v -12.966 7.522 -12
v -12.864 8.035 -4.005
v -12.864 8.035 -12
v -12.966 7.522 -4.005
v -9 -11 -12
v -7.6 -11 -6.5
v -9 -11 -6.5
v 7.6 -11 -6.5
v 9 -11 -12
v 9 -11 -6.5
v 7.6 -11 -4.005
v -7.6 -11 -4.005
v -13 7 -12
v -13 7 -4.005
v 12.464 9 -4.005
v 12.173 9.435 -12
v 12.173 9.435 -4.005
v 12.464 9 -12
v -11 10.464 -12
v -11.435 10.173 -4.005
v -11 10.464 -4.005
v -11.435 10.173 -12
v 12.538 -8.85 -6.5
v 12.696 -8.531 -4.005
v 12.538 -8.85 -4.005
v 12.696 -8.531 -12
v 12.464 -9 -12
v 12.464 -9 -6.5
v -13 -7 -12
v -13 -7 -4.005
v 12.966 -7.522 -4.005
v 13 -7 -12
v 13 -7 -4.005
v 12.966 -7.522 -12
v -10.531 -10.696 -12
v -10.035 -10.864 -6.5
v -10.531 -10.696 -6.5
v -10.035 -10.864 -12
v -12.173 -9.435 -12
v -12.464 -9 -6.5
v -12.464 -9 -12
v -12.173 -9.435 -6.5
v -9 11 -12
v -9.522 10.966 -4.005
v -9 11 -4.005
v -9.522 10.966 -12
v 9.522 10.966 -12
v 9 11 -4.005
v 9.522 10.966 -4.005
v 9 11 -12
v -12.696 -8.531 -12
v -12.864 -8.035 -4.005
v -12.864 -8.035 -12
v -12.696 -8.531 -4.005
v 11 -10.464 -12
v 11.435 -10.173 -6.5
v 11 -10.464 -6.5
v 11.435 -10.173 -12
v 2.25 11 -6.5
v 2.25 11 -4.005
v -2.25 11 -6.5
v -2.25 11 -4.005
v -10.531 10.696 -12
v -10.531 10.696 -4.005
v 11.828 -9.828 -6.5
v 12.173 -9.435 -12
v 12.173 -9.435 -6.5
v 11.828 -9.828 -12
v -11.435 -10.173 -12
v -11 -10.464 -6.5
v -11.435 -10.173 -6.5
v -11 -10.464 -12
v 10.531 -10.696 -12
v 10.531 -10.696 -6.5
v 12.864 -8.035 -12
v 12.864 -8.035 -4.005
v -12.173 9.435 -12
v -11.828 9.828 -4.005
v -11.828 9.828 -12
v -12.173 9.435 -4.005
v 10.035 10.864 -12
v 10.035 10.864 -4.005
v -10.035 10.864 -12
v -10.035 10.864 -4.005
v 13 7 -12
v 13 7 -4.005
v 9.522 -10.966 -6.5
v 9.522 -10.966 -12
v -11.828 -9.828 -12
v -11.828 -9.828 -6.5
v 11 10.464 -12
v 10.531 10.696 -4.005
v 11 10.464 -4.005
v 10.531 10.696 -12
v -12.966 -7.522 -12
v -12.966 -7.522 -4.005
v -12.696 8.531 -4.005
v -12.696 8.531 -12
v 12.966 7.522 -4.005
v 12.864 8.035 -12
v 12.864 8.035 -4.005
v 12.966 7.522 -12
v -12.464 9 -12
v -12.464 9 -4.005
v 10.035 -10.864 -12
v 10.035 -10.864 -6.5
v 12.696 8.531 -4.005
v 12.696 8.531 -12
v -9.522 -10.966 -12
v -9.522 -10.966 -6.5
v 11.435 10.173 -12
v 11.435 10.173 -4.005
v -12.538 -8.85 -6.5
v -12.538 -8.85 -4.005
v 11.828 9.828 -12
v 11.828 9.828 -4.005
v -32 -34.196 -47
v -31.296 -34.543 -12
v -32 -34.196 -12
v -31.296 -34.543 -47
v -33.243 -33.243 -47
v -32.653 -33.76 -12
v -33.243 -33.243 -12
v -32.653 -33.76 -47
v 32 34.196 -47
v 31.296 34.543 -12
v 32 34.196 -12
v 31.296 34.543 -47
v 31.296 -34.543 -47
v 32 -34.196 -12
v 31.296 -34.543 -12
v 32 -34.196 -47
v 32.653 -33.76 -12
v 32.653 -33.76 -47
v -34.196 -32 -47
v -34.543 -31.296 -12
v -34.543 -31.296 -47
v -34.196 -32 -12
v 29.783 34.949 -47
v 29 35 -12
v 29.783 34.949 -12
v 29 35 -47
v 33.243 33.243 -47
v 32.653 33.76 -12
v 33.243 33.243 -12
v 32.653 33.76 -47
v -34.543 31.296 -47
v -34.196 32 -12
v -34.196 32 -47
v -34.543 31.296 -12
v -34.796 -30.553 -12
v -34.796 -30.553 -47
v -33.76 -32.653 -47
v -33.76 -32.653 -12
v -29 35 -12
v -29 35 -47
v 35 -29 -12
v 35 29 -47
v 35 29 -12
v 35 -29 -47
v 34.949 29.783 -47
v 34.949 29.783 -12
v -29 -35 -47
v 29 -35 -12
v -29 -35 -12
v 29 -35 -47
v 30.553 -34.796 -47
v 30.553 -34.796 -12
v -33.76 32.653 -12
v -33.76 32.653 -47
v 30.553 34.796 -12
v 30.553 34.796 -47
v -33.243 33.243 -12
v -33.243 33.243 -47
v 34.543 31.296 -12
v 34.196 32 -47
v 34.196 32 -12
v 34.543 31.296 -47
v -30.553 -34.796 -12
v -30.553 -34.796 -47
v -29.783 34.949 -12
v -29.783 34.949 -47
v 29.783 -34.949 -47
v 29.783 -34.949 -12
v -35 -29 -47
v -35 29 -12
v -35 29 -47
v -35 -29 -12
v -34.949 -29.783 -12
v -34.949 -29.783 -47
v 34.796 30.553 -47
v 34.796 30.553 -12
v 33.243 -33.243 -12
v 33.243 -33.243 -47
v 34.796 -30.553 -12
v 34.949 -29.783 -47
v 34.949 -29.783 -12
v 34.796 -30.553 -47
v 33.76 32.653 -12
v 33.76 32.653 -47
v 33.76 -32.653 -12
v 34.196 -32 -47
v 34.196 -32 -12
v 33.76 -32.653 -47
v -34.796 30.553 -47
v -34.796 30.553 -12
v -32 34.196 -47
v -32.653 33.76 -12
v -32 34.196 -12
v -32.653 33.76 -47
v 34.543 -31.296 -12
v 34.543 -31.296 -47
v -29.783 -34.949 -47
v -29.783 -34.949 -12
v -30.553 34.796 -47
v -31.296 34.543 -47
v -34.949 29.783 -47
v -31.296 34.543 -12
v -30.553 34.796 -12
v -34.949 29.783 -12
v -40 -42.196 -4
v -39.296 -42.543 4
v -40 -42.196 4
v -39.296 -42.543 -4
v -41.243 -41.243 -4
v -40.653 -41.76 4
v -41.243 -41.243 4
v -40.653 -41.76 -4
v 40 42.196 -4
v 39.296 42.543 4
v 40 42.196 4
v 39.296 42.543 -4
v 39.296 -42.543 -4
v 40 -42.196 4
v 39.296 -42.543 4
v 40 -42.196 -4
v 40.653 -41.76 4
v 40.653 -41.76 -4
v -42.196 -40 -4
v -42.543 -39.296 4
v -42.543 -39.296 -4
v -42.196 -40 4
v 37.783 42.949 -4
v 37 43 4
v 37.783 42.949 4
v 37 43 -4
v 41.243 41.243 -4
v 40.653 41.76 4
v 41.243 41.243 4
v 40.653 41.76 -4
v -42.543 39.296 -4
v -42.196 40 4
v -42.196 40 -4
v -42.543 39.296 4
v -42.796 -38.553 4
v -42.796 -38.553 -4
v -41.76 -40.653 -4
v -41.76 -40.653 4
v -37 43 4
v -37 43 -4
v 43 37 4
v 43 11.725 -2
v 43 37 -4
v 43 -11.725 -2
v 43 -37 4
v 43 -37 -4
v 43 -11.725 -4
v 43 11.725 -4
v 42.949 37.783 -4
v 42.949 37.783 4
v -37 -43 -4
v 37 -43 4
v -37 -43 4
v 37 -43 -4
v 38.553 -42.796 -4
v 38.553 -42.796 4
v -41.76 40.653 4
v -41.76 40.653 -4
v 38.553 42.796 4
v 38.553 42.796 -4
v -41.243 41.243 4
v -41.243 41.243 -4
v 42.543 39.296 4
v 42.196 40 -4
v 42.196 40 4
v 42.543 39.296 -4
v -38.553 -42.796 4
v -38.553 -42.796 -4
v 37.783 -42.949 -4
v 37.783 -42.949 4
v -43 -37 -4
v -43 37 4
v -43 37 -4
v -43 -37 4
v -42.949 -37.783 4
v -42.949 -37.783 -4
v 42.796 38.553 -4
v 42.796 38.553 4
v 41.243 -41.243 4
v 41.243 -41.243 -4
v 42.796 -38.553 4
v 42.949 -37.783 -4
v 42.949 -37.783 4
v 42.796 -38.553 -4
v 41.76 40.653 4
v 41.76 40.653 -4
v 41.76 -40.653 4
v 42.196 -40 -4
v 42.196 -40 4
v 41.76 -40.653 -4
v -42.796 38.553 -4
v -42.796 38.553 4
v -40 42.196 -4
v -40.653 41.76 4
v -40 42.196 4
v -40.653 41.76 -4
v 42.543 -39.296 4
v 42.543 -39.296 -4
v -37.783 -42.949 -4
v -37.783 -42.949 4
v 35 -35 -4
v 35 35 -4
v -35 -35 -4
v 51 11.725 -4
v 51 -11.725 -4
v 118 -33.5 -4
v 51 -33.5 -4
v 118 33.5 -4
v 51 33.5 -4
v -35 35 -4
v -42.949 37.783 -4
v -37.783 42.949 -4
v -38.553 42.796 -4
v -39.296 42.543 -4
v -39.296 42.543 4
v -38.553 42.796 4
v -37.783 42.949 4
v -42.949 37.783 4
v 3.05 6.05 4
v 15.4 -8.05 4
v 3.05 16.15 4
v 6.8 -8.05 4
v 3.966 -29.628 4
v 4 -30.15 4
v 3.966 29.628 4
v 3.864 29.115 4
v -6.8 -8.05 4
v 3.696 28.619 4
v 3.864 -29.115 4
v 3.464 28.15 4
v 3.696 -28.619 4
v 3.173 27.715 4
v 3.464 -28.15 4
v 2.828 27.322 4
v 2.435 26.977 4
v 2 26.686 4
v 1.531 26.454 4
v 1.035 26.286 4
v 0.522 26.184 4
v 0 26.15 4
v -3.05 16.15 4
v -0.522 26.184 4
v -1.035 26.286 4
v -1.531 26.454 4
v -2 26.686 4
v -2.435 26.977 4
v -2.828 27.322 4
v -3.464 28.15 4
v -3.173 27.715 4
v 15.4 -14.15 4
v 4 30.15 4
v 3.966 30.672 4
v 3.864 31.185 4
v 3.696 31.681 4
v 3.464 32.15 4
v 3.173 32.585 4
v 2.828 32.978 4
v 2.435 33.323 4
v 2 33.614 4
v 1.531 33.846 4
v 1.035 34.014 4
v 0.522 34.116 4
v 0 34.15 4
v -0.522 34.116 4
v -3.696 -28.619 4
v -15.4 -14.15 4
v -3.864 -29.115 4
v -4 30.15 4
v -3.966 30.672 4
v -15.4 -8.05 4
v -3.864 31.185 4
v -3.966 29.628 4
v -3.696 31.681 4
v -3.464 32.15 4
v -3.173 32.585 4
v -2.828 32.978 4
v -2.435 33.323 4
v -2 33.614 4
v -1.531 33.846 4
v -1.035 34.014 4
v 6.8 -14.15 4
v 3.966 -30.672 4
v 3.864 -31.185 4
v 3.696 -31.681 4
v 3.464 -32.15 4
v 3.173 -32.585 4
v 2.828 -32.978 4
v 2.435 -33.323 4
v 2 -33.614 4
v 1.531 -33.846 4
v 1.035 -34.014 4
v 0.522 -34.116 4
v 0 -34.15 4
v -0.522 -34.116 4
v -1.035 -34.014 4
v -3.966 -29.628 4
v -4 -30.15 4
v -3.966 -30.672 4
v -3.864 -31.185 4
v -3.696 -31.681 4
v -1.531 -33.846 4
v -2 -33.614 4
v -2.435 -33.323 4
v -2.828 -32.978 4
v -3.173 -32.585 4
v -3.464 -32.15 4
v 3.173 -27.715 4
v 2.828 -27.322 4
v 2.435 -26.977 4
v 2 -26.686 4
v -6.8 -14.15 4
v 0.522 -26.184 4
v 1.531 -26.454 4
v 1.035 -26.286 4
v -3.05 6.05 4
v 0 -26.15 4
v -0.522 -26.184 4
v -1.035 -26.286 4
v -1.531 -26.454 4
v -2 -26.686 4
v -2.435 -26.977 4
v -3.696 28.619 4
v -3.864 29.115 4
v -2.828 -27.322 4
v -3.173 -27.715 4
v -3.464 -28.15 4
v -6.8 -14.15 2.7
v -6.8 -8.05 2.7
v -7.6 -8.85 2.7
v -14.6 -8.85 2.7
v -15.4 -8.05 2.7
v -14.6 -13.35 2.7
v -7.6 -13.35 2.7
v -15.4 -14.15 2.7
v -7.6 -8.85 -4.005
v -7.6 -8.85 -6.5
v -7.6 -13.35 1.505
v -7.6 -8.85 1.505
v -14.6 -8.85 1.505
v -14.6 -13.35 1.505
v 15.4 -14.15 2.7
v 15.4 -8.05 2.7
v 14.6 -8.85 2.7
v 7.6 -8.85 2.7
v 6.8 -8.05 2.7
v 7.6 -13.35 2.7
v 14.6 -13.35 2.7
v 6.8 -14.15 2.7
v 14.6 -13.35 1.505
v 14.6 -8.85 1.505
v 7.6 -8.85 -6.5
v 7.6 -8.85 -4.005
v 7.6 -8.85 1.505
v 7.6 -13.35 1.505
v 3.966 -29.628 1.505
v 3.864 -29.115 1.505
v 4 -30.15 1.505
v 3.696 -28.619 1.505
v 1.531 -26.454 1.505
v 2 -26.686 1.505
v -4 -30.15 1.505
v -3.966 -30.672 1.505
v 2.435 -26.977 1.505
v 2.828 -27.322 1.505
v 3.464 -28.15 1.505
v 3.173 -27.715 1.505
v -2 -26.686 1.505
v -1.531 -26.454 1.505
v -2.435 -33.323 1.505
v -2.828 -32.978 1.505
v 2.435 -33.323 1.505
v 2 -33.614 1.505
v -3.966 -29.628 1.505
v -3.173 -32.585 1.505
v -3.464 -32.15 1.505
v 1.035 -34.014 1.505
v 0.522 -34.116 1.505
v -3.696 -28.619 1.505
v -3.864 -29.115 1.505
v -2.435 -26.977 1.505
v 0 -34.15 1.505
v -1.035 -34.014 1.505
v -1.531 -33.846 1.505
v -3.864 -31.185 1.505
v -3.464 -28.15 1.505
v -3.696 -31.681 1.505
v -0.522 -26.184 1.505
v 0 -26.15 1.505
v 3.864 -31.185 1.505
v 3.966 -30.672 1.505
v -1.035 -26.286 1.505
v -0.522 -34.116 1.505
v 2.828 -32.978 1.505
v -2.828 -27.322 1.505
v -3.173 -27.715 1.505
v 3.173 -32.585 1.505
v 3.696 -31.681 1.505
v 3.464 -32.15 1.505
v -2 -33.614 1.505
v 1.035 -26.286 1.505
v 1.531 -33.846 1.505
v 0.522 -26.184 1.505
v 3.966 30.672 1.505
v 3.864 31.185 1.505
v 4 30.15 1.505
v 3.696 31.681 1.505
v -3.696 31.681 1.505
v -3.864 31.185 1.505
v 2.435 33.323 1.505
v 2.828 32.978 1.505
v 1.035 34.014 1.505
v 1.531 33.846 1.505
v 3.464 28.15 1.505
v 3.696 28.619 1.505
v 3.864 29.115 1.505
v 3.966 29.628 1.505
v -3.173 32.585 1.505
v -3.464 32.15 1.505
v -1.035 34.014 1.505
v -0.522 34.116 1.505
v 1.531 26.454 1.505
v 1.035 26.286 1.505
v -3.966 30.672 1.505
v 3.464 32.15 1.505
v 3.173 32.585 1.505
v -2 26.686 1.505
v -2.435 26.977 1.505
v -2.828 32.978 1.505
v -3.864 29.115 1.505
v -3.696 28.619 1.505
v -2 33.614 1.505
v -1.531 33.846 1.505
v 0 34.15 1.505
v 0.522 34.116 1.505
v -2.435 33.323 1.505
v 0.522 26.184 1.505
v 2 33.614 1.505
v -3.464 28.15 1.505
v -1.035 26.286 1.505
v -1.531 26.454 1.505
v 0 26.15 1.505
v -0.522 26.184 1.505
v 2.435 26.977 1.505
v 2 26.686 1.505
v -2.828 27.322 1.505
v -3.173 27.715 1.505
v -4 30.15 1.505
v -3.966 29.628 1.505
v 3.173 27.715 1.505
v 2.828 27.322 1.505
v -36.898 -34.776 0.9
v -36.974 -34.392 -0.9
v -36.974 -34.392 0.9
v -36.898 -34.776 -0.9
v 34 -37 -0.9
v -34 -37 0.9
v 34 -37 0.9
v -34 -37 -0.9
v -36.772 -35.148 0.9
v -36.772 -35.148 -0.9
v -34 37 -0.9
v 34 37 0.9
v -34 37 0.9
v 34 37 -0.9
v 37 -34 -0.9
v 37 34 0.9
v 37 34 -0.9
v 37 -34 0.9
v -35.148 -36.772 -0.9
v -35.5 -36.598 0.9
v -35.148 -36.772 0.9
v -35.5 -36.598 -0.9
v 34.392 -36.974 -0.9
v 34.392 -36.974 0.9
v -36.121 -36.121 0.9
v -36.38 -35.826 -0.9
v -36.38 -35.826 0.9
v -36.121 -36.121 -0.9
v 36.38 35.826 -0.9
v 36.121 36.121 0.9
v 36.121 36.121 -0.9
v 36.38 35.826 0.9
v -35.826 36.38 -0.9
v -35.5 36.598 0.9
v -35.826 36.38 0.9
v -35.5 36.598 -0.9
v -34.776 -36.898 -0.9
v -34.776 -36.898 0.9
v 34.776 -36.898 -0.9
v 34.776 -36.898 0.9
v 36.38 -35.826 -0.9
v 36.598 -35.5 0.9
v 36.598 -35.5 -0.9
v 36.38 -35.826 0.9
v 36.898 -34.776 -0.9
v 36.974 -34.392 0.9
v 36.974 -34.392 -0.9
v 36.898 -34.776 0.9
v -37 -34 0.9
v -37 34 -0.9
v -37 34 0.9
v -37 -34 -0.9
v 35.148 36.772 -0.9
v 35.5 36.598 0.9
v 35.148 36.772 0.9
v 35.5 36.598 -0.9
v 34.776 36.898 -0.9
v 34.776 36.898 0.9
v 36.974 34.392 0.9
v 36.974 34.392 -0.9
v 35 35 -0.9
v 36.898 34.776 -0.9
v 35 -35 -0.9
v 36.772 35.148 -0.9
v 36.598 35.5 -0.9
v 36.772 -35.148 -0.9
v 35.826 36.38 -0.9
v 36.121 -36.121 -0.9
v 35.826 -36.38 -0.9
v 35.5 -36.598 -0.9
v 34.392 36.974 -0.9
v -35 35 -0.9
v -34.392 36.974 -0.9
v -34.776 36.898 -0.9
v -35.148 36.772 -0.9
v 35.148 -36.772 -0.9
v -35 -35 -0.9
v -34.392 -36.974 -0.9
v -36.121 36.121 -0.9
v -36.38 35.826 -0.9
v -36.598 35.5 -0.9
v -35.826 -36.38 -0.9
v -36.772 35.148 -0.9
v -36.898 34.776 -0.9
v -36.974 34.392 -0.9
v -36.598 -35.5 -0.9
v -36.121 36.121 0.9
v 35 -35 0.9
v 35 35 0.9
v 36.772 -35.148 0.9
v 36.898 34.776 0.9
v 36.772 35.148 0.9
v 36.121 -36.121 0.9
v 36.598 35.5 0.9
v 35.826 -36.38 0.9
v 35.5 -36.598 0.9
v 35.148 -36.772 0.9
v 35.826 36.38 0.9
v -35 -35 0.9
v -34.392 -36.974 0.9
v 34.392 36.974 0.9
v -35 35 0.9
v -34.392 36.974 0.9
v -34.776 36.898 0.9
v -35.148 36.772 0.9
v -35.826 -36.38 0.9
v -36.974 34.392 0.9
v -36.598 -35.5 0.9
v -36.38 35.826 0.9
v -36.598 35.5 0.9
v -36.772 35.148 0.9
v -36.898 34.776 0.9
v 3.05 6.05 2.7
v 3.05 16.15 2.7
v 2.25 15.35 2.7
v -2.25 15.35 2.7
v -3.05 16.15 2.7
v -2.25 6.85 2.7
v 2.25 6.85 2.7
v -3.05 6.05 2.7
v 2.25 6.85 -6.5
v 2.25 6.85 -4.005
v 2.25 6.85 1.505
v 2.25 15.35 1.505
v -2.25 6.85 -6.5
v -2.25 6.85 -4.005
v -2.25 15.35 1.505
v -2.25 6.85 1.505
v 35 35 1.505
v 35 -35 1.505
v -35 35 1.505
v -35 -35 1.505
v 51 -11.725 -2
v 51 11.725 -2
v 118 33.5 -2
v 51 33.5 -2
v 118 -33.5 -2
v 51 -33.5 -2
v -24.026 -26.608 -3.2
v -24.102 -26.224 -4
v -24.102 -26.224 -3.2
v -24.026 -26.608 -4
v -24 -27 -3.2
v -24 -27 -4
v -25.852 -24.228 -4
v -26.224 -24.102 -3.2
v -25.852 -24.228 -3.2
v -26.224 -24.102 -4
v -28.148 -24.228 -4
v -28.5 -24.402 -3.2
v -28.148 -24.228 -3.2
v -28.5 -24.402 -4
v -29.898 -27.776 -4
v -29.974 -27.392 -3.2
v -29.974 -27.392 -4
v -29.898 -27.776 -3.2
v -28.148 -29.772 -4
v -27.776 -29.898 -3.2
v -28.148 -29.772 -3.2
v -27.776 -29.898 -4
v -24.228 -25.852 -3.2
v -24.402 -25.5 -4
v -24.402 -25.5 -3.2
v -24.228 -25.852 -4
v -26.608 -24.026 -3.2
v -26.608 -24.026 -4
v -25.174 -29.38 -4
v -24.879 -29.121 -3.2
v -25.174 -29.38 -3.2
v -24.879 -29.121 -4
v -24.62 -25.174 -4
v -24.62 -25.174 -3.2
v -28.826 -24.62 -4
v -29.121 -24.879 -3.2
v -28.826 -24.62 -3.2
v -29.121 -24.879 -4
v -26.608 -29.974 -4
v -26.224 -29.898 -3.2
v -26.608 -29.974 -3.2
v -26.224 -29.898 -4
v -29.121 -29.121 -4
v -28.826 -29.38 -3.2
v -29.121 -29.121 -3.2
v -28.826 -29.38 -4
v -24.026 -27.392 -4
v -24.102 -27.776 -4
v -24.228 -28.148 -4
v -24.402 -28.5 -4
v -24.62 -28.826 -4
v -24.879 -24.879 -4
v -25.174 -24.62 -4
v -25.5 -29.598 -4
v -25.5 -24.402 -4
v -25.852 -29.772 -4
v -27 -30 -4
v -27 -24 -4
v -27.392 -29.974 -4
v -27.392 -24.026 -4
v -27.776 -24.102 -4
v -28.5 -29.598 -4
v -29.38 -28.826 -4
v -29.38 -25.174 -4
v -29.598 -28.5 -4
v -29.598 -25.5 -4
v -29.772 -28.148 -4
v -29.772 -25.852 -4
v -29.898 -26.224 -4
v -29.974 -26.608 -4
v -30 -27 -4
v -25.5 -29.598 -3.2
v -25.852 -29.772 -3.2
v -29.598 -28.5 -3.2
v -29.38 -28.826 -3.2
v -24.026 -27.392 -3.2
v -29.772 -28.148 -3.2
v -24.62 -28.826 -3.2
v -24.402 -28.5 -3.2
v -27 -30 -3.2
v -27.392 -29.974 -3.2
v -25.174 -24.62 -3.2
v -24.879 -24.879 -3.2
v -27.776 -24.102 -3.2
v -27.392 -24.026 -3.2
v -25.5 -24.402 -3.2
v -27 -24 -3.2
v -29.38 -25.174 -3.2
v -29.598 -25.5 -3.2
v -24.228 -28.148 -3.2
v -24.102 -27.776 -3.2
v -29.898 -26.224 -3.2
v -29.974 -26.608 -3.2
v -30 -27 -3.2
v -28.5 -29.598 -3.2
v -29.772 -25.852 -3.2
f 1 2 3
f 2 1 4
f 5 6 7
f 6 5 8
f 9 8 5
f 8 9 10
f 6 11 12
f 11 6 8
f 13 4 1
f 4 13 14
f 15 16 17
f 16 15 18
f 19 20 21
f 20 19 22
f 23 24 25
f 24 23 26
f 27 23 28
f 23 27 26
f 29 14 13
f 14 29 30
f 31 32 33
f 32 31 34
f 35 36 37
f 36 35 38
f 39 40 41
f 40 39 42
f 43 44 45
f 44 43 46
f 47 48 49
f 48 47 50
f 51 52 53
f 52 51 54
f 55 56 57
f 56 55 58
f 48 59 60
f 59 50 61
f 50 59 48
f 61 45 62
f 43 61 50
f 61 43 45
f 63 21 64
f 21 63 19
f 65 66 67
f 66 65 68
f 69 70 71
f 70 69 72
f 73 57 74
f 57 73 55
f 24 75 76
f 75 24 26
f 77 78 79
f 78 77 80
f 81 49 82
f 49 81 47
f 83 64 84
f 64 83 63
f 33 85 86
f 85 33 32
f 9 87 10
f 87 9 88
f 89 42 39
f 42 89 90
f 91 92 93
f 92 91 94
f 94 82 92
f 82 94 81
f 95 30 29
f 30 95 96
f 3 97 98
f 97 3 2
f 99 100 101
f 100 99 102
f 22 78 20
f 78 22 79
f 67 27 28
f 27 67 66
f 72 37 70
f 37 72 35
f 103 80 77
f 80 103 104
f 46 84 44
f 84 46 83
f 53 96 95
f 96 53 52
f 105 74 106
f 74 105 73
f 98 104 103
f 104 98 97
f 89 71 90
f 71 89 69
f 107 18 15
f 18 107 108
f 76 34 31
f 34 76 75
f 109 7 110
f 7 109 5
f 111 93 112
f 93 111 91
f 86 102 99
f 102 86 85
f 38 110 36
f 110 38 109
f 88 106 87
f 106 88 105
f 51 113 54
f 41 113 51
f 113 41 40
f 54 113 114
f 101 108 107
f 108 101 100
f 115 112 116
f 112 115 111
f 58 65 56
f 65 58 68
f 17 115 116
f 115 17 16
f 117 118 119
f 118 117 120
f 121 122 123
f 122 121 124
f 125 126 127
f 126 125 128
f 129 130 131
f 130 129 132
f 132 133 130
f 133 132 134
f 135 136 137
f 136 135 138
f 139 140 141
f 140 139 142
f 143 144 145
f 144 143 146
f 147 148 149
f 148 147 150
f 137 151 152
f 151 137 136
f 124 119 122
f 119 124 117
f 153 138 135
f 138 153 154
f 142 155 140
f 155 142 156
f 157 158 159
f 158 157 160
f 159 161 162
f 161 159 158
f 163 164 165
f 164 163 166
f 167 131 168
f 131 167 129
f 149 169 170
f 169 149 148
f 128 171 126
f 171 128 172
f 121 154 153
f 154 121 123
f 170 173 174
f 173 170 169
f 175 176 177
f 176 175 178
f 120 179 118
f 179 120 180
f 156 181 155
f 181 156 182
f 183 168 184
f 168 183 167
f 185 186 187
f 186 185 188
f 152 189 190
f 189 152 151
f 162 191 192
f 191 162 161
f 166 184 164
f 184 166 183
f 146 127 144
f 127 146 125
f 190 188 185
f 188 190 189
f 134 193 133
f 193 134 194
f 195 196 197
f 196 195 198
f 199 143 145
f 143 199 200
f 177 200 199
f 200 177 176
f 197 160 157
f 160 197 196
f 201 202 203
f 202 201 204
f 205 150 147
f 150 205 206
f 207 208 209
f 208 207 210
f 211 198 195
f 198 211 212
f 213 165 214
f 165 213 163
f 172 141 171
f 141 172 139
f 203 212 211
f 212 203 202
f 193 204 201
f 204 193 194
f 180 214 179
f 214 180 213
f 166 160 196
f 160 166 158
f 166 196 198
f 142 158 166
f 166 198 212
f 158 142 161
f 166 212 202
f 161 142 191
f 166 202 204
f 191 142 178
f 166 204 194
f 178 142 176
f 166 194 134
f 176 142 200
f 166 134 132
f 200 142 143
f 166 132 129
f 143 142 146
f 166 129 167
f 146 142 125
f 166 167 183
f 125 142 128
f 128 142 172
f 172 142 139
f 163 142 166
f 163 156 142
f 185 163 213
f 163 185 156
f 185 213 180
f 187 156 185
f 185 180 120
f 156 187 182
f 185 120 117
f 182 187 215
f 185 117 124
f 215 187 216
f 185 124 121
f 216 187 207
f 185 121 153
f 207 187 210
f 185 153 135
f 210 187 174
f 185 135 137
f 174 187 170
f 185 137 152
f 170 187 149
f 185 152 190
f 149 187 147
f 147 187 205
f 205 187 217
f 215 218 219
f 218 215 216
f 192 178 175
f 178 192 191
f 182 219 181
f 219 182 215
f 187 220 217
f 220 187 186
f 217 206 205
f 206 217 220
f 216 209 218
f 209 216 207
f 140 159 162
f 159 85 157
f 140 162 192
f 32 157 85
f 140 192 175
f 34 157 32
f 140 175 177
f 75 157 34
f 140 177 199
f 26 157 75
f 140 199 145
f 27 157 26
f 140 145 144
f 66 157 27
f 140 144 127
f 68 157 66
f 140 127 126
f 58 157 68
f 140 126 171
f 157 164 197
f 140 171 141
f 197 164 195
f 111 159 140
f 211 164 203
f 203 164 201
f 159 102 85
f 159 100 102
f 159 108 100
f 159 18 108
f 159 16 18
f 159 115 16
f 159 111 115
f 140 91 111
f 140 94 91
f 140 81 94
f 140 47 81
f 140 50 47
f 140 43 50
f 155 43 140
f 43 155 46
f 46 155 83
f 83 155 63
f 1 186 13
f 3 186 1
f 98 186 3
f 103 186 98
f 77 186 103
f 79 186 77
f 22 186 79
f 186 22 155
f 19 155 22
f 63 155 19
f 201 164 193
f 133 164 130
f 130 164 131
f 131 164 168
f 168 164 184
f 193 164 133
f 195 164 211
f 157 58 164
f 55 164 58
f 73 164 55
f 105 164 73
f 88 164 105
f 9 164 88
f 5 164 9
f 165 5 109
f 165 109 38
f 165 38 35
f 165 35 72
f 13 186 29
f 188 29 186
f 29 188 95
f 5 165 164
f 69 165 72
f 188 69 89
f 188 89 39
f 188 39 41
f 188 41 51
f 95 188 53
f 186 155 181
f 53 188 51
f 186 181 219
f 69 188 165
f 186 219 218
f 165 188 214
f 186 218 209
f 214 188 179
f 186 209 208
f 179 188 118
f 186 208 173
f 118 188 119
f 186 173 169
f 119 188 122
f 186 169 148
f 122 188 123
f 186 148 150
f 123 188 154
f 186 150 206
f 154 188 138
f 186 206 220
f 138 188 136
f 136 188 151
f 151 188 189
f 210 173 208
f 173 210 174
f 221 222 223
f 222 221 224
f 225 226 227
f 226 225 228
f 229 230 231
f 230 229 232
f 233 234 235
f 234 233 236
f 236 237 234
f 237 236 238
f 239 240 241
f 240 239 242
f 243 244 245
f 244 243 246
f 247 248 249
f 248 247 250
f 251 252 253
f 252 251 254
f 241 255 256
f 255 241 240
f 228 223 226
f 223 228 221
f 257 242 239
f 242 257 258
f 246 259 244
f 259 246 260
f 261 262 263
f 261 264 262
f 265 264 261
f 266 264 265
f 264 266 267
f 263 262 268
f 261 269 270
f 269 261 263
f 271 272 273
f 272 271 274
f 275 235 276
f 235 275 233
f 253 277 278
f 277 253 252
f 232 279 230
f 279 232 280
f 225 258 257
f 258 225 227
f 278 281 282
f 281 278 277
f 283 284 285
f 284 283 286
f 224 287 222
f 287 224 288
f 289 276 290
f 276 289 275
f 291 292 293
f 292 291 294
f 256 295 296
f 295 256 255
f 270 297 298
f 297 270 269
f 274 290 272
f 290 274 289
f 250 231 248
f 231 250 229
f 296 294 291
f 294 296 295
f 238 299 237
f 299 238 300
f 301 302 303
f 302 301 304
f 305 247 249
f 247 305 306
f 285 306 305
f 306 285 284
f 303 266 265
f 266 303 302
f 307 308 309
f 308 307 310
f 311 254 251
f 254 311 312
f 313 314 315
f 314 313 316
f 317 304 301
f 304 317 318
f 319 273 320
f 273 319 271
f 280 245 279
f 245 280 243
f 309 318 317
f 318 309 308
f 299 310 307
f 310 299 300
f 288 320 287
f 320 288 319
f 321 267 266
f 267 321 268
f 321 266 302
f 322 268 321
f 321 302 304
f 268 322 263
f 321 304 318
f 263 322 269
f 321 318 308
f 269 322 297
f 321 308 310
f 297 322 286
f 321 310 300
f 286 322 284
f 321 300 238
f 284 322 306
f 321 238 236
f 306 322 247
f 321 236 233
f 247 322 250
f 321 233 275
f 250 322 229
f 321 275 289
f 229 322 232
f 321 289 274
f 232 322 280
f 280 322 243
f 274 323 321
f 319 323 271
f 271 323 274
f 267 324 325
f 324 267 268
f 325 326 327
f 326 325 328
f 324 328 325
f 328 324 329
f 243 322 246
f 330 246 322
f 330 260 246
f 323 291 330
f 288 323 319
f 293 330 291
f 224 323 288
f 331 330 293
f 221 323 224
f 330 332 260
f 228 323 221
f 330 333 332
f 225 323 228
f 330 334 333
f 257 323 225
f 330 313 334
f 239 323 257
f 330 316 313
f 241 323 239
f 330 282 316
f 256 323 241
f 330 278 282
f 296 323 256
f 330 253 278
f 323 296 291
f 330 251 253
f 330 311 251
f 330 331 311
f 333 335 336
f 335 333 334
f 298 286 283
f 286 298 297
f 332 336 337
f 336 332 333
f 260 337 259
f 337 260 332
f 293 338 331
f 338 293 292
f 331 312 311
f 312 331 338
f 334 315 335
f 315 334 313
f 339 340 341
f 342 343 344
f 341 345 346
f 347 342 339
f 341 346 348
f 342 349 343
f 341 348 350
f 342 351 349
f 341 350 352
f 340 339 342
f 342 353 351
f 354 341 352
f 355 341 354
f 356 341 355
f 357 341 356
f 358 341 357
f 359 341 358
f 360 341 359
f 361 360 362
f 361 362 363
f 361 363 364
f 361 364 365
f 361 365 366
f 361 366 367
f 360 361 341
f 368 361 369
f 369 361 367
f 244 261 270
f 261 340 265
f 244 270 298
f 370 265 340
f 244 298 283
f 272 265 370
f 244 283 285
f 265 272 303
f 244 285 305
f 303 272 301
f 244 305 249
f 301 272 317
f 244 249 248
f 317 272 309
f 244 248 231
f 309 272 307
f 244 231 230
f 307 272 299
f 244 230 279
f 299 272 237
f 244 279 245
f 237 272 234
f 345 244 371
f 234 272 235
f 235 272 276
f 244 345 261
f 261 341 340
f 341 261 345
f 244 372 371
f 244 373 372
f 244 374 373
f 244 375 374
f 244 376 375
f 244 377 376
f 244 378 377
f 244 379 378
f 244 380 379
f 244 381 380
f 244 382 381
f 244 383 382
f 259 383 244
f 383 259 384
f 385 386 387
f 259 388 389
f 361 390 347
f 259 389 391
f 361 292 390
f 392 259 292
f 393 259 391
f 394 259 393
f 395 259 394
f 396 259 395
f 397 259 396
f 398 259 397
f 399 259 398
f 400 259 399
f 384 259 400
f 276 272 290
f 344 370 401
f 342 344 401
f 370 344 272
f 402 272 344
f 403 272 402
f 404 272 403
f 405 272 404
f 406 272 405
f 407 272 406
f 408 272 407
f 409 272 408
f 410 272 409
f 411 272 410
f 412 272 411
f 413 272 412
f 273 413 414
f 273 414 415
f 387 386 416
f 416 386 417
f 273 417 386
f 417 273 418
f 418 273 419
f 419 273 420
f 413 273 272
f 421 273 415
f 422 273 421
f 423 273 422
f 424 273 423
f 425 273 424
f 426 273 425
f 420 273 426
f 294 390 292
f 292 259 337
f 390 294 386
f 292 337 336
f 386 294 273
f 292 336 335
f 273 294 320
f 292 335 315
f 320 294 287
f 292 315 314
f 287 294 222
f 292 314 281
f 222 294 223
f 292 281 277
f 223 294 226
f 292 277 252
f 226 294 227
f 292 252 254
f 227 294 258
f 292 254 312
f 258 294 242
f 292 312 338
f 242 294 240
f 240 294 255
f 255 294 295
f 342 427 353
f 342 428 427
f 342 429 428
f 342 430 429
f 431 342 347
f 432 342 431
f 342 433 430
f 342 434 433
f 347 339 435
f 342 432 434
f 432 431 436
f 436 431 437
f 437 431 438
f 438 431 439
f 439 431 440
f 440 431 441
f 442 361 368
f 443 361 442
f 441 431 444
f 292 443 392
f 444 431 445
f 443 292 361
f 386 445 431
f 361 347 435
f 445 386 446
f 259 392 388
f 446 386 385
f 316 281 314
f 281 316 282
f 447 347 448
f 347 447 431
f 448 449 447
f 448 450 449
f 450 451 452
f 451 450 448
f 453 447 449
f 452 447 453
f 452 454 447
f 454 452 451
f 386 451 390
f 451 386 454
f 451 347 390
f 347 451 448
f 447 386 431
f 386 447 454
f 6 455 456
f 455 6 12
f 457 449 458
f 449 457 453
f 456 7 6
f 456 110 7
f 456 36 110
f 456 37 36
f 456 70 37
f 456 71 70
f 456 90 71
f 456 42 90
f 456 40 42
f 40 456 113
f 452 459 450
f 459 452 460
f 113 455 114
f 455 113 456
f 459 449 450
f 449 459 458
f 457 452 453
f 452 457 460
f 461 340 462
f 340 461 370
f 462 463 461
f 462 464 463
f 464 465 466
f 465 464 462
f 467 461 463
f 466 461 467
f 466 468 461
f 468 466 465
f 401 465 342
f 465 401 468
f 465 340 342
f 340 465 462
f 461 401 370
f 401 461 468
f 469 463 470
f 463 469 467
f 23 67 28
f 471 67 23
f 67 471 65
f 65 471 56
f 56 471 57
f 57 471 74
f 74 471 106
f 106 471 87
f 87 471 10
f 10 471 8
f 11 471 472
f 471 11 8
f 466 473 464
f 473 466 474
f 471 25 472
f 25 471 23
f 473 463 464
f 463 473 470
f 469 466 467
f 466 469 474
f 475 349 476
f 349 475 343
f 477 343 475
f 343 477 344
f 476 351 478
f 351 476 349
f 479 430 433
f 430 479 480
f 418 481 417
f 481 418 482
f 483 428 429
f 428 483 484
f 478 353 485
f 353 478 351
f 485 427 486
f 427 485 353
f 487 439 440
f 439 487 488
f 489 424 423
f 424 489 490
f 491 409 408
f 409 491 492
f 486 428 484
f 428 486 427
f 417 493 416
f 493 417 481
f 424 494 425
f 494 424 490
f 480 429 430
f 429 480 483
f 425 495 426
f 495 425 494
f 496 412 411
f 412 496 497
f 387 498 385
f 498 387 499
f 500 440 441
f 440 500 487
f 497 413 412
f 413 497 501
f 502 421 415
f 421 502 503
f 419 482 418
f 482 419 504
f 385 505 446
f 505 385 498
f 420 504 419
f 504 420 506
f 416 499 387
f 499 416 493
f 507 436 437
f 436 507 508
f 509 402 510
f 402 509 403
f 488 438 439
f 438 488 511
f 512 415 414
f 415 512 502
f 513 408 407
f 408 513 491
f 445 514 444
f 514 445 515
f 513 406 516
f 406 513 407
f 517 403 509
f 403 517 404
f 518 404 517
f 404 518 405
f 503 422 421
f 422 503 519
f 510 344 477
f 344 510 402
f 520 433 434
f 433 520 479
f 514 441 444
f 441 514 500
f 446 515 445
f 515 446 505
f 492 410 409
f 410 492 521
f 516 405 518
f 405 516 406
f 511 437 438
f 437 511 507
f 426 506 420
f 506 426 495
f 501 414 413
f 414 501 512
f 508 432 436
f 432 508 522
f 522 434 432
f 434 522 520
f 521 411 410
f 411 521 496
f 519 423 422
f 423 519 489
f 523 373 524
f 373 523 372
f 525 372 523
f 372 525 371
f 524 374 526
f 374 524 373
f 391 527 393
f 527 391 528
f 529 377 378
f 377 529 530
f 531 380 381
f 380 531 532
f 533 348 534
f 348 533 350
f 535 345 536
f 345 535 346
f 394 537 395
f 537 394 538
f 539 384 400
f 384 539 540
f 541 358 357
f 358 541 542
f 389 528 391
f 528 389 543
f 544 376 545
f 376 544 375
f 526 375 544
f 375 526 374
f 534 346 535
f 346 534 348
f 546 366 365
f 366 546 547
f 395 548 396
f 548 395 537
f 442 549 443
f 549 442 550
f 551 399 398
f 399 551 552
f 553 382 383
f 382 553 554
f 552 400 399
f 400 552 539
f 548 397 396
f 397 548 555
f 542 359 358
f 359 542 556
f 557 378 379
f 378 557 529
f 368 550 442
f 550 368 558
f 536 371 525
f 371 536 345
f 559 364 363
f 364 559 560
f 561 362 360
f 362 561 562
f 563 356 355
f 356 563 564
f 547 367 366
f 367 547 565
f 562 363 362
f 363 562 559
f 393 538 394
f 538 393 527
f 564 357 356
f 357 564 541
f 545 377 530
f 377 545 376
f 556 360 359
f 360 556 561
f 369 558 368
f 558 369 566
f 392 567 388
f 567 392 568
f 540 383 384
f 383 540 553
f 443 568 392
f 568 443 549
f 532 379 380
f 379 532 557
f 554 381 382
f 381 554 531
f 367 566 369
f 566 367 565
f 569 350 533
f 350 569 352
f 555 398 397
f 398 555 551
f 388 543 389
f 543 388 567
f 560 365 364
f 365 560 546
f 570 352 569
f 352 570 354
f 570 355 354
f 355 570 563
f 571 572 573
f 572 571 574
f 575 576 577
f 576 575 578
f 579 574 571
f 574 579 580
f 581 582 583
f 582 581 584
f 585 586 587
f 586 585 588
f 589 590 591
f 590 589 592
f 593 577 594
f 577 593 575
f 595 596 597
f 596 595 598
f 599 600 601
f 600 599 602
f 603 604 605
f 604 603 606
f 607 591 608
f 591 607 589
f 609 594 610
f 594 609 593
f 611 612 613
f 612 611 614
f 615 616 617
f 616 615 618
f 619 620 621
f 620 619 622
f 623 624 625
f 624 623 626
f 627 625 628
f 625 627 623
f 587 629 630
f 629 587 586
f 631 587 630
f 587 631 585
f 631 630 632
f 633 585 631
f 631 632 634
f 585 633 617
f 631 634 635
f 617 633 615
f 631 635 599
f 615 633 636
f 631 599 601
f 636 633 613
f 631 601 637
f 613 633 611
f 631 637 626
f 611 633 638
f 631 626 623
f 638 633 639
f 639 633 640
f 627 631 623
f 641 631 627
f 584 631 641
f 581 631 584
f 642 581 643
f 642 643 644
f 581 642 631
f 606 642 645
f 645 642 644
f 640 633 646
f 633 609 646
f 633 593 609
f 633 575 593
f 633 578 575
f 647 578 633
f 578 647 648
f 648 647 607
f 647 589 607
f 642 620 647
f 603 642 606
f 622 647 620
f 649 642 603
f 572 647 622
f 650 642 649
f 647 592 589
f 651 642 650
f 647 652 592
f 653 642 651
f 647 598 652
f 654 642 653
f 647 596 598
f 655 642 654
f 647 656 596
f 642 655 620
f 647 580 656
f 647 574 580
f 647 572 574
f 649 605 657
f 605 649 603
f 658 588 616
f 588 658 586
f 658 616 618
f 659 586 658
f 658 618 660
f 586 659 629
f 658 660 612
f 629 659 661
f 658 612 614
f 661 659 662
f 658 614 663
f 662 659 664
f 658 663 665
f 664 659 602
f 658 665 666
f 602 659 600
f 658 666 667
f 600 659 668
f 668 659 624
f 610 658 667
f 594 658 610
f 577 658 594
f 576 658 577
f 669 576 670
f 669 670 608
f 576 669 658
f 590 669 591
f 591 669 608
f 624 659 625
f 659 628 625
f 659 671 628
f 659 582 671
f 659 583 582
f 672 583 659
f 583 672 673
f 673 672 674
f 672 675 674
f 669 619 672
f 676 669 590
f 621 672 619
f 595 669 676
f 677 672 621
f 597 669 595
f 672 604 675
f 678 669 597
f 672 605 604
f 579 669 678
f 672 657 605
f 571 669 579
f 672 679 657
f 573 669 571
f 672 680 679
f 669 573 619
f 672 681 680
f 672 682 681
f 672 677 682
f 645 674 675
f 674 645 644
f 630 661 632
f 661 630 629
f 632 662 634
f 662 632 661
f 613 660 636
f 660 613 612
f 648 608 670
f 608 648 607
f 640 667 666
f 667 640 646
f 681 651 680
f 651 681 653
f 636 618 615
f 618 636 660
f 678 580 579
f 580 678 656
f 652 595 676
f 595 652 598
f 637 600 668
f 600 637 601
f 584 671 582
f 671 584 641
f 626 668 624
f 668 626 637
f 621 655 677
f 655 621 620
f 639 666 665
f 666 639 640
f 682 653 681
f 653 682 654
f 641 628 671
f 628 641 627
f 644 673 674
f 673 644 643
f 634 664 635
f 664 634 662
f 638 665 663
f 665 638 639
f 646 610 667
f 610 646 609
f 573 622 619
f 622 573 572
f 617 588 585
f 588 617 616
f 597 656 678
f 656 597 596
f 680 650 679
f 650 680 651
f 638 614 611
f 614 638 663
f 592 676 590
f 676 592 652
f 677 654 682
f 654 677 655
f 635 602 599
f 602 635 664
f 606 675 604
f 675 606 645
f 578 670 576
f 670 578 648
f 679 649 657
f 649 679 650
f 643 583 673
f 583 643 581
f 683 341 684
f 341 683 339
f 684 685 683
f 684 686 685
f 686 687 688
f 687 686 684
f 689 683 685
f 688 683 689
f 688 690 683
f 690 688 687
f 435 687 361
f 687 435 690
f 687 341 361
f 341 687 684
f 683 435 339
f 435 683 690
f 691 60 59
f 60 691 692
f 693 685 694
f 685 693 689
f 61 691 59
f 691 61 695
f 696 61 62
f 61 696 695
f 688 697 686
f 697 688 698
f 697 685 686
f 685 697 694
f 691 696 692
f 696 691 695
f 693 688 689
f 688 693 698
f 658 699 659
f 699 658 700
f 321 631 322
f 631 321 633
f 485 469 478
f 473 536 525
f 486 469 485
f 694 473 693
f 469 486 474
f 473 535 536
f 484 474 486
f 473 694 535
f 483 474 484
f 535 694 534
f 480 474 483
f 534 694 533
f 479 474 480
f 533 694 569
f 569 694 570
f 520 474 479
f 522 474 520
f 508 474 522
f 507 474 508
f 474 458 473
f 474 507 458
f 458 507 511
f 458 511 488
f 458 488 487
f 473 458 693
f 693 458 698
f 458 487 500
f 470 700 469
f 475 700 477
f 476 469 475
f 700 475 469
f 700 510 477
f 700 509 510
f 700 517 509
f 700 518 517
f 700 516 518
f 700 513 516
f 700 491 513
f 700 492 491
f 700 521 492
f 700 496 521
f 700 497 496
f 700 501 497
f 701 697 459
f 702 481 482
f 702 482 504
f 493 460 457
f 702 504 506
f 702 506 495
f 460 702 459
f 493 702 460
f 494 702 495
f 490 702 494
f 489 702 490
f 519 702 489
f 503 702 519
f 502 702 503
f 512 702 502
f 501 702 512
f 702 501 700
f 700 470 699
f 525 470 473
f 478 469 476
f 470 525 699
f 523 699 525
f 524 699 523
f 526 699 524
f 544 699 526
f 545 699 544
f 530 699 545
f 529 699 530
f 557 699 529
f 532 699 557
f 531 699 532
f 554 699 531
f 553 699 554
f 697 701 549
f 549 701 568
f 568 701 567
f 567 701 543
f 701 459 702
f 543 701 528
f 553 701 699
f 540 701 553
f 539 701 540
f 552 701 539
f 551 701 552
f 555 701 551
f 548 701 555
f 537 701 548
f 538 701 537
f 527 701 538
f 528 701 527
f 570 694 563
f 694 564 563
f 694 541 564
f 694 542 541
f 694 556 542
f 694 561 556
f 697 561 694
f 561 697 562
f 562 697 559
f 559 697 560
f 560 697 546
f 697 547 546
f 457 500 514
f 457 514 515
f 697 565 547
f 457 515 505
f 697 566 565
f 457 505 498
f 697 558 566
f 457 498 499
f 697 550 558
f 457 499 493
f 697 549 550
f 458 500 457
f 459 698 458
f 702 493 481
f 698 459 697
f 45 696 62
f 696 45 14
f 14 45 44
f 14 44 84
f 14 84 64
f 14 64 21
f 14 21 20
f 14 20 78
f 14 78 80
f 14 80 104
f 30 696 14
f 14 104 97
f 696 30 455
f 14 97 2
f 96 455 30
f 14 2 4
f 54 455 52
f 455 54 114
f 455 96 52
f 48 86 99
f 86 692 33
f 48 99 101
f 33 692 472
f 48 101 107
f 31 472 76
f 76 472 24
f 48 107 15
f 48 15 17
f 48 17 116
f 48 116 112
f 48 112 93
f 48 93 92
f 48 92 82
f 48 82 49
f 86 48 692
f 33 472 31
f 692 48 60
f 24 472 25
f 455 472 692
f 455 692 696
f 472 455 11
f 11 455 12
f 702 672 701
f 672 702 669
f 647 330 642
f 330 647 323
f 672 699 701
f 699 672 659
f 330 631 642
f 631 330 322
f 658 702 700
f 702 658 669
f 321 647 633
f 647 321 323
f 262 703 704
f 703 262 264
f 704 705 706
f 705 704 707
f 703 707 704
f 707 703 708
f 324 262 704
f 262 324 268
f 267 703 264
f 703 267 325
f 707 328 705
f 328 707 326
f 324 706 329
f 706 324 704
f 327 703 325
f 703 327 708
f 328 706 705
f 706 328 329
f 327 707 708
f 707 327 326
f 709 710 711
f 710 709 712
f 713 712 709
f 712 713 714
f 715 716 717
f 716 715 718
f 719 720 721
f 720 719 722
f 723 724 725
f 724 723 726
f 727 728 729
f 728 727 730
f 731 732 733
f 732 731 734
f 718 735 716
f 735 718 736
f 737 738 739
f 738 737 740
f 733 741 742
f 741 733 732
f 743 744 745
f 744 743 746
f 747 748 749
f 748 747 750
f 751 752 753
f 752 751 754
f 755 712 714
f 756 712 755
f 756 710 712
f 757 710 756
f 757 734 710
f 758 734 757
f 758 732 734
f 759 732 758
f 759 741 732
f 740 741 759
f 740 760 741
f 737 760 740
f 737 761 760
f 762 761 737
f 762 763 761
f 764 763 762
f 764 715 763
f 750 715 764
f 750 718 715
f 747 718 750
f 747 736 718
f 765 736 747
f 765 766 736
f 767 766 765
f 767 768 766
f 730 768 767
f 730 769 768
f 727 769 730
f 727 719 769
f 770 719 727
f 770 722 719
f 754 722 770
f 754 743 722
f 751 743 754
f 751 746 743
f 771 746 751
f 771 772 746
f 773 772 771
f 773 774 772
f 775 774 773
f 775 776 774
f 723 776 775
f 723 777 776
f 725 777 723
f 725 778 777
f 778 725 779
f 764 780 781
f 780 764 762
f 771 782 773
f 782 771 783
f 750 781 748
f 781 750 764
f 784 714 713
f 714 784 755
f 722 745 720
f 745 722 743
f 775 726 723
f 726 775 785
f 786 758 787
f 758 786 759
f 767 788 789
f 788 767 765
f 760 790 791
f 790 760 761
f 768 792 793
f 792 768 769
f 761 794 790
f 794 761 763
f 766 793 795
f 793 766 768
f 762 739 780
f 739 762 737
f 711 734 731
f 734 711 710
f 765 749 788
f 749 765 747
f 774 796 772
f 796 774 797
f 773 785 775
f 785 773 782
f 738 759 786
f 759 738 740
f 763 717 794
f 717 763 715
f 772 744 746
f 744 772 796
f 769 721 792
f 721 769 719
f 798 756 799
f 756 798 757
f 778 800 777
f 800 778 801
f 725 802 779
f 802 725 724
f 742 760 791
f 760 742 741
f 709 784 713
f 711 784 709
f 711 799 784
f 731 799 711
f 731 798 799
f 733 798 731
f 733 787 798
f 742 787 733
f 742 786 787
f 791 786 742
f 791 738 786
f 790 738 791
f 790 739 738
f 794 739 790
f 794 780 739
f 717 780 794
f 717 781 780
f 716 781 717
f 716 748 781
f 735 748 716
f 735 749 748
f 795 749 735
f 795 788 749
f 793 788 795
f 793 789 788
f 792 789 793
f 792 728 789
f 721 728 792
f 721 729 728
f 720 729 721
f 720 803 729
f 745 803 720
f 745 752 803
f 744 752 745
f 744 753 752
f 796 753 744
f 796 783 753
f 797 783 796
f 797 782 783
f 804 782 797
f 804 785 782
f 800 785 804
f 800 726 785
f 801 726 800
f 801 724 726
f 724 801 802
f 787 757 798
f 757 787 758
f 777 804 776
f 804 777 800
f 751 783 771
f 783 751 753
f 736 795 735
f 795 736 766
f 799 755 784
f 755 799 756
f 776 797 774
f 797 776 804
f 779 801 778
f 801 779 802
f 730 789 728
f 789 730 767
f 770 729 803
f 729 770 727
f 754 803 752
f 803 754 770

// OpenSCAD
// Old unswitched mains socket (UK-style) - one connected solid
// Dimension-driven placement; no floating parts

// Parameters
socket_style = 0; //[0:1:1]
switched = 0; //[0:1:1]
include_earth_cutout = 1; //[0:1:1]
include_panel_cutout = 1; //[0:1:1]
panel_cutout_small = 0; //[0:1:1]

faceplate_w = 86; //[60:172:1]
faceplate_h = 86; //[60:172:1]
faceplate_t = 8;  //[4:16:1]
corner_r = 6;     //[3:12:1]

body_overlap = 1; //[0.5:2:0.5]

screw_pitch_y = 60.3; //[45:90:0.1]
screw_clear_d = 3.8;  //[3:5:0.1]
screw_csk_d = 8;      //[6:12:0.1]
screw_csk_depth = 3;  //[1:6:0.1]

pin_pitch_x = 22.2;   //[18:28:0.1]
pin_y_offset = -11.1; //[-20:0:0.1]
earth_y_offset = 11.1; //[0:20:0.1]

ln_aperture_w = 7;    //[5:10:0.1]
ln_aperture_h = 4.5;  //[3:7:0.1]
earth_aperture_w = 4.5; //[3:7:0.1]
earth_aperture_h = 8.5; //[6:12:0.1]
aperture_depth = 10;  //[6:20:1]

rear_cavity_depth = 22; //[12:44:1]
rear_wall_t = 2.5;      //[1.5:5:0.1]
rear_cavity_w = 70;     //[50:120:1]
rear_cavity_h = 70;     //[50:120:1]

panel_cutout_w = 67; //[45:120:1]
panel_cutout_h = 67; //[45:120:1]
panel_cutout_t = 2;  //[1:6:1]
panel_tab_w = 10;    //[6:20:1]

earth_ref_d = 6;       //[4:12:0.5]
earth_ref_inset = 8;   //[4:16:0.5]

// Extra detailing parameters (dimension-driven)
inner_border_inset = 6;     // inset of inner recessed border from faceplate edge
inner_border_depth = 0.8;   // shallow recess depth
aperture_chamfer = 0.8;     // small lead-in chamfer for apertures

back_box_w = 70;
back_box_h = 70;
back_box_d = 35;

neck_w = 26;   // widened to resemble typical socket body transition
neck_h = 22;
neck_d = 10;

eps = 0.01;

// Rounded rectangle prism (centered)
module rr_prism(w, h, t, r, center=true) {
  translate(center ? [0,0,0] : [w/2, h/2, t/2])
    hull() {
      for (sx = [-1, 1], sy = [-1, 1])
        translate([sx*(w/2 - r), sy*(h/2 - r), 0])
          cylinder(r=r, h=t, center=true, $fn=48);
    }
}

// Faceplate solid
module faceplate_solid() {
  rr_prism(faceplate_w, faceplate_h, faceplate_t, corner_r, center=true);
}

// Old unswitched socket front detailing (recessed border + apertures + screws)
module faceplate_cutouts() {
  // Inner recessed border (old style)
  rr_prism(
    faceplate_w - 2*inner_border_inset,
    faceplate_h - 2*inner_border_inset,
    inner_border_depth + body_overlap,
    max(0.1, corner_r - inner_border_inset/2),
    center=true
  );

  // Apertures (with slight chamfer lead-in)
  for (sx = [-1, 1]) {
    // Chamfer lead-in
    translate([sx*pin_pitch_x/2, pin_y_offset, faceplate_t/2 - (aperture_chamfer/2)])
      cube([ln_aperture_w + 2*aperture_chamfer,
            ln_aperture_h + 2*aperture_chamfer,
            aperture_chamfer + body_overlap], center=true);

    // Main slot
    translate([sx*pin_pitch_x/2, pin_y_offset, faceplate_t/2 - (aperture_depth/2)])
      cube([ln_aperture_w, ln_aperture_h, aperture_depth + body_overlap], center=true);
  }

  // Earth aperture
  translate([0, earth_y_offset, faceplate_t/2 - (aperture_chamfer/2)])
    cube([earth_aperture_w + 2*aperture_chamfer,
          earth_aperture_h + 2*aperture_chamfer,
          aperture_chamfer + body_overlap], center=true);

  translate([0, earth_y_offset, faceplate_t/2 - (aperture_depth/2)])
    cube([earth_aperture_w, earth_aperture_h, aperture_depth + body_overlap], center=true);

  // Mounting screw holes + countersinks
  for (sy = [-1, 1]) {
    translate([0, sy*screw_pitch_y/2, 0])
      cylinder(r=screw_clear_d/2, h=faceplate_t + 2*body_overlap, center=true, $fn=48);

    translate([0, sy*screw_pitch_y/2, faceplate_t/2 - (screw_csk_depth + body_overlap)/2])
      cylinder(r=screw_csk_d/2, h=screw_csk_depth + body_overlap, center=true, $fn=48);
  }

  // Rear cavity (keeps rear wall thickness)
  // Ensure cavity does not break through the front: leave rear_wall_t at the back of faceplate
  cavity_h = min(rear_cavity_depth, max(0, faceplate_t - rear_wall_t));
  if (cavity_h > 0)
    translate([0, 0, -faceplate_t/2 + cavity_h/2])
      cube([rear_cavity_w, rear_cavity_h, cavity_h + eps], center=true);
}

// Back box + neck (connected to faceplate)
module back_box_connected() {
  // Neck connects faceplate to back box with overlap into faceplate
  translate([0, 0, -faceplate_t/2 - neck_d/2 + body_overlap])
    rr_prism(neck_w, neck_h, neck_d, r=min(4, min(neck_w,neck_h)/4), center=true);

  // Back box (old style surface box) connected to neck with overlap
  translate([0, 0, -faceplate_t/2 - neck_d - back_box_d/2 + 2*body_overlap])
    rr_prism(back_box_w, back_box_h, back_box_d, r=min(6, min(back_box_w,back_box_h)/10), center=true);
}

// Earth reference marker (small bump; stays connected to rear cavity floor region)
module earth_reference_bump() {
  // Put bump on the rear cavity "floor" area (still part of the solid)
  translate(
    [-rear_cavity_w/2 + earth_ref_inset,
     -rear_cavity_h/2 + earth_ref_inset,
     -faceplate_t/2 + max(0.6, inner_border_depth)/2]
  )
    cylinder(r=earth_ref_d/2, h=max(0.6, inner_border_depth), center=true, $fn=48);
}

// Panel cutout tab (connected, not floating)
module panel_cutout_connected() {
  // Keep it as an optional connected "template" piece, but ensure it attaches to the faceplate edge.
  // Use a thin bridge that overlaps into the faceplate by body_overlap.
  cut_w = panel_cutout_small ? panel_cutout_w*0.7 : panel_cutout_w;
  cut_h = panel_cutout_small ? panel_cutout_h*0.7 : panel_cutout_h;

  // Bridge/tab
  translate([faceplate_w/2 + panel_tab_w/2 - body_overlap, 0, -faceplate_t/2 + panel_cutout_t/2])
    cube([panel_tab_w + 2*body_overlap, cut_h*0.35, panel_cutout_t], center=true);

  // Cutout plate
  translate([faceplate_w/2 + panel_tab_w + cut_w/2 - 2*body_overlap, 0, -faceplate_t/2 + panel_cutout_t/2])
    cube([cut_w, cut_h, panel_cutout_t], center=true);
}

// Assembly: ONE connected solid
module assembly() {
  union() {
    // Main socket body (faceplate with cutouts + connected back box)
    difference() {
      union() {
        faceplate_solid();
        back_box_connected();
      }
      faceplate_cutouts();
    }

    // Optional earth reference bump (adds material, stays connected)
    if (include_earth_cutout)
      earth_reference_bump();

    // Optional connected panel cutout geometry
    if (include_panel_cutout)
      panel_cutout_connected();
  }
}

assembly();
